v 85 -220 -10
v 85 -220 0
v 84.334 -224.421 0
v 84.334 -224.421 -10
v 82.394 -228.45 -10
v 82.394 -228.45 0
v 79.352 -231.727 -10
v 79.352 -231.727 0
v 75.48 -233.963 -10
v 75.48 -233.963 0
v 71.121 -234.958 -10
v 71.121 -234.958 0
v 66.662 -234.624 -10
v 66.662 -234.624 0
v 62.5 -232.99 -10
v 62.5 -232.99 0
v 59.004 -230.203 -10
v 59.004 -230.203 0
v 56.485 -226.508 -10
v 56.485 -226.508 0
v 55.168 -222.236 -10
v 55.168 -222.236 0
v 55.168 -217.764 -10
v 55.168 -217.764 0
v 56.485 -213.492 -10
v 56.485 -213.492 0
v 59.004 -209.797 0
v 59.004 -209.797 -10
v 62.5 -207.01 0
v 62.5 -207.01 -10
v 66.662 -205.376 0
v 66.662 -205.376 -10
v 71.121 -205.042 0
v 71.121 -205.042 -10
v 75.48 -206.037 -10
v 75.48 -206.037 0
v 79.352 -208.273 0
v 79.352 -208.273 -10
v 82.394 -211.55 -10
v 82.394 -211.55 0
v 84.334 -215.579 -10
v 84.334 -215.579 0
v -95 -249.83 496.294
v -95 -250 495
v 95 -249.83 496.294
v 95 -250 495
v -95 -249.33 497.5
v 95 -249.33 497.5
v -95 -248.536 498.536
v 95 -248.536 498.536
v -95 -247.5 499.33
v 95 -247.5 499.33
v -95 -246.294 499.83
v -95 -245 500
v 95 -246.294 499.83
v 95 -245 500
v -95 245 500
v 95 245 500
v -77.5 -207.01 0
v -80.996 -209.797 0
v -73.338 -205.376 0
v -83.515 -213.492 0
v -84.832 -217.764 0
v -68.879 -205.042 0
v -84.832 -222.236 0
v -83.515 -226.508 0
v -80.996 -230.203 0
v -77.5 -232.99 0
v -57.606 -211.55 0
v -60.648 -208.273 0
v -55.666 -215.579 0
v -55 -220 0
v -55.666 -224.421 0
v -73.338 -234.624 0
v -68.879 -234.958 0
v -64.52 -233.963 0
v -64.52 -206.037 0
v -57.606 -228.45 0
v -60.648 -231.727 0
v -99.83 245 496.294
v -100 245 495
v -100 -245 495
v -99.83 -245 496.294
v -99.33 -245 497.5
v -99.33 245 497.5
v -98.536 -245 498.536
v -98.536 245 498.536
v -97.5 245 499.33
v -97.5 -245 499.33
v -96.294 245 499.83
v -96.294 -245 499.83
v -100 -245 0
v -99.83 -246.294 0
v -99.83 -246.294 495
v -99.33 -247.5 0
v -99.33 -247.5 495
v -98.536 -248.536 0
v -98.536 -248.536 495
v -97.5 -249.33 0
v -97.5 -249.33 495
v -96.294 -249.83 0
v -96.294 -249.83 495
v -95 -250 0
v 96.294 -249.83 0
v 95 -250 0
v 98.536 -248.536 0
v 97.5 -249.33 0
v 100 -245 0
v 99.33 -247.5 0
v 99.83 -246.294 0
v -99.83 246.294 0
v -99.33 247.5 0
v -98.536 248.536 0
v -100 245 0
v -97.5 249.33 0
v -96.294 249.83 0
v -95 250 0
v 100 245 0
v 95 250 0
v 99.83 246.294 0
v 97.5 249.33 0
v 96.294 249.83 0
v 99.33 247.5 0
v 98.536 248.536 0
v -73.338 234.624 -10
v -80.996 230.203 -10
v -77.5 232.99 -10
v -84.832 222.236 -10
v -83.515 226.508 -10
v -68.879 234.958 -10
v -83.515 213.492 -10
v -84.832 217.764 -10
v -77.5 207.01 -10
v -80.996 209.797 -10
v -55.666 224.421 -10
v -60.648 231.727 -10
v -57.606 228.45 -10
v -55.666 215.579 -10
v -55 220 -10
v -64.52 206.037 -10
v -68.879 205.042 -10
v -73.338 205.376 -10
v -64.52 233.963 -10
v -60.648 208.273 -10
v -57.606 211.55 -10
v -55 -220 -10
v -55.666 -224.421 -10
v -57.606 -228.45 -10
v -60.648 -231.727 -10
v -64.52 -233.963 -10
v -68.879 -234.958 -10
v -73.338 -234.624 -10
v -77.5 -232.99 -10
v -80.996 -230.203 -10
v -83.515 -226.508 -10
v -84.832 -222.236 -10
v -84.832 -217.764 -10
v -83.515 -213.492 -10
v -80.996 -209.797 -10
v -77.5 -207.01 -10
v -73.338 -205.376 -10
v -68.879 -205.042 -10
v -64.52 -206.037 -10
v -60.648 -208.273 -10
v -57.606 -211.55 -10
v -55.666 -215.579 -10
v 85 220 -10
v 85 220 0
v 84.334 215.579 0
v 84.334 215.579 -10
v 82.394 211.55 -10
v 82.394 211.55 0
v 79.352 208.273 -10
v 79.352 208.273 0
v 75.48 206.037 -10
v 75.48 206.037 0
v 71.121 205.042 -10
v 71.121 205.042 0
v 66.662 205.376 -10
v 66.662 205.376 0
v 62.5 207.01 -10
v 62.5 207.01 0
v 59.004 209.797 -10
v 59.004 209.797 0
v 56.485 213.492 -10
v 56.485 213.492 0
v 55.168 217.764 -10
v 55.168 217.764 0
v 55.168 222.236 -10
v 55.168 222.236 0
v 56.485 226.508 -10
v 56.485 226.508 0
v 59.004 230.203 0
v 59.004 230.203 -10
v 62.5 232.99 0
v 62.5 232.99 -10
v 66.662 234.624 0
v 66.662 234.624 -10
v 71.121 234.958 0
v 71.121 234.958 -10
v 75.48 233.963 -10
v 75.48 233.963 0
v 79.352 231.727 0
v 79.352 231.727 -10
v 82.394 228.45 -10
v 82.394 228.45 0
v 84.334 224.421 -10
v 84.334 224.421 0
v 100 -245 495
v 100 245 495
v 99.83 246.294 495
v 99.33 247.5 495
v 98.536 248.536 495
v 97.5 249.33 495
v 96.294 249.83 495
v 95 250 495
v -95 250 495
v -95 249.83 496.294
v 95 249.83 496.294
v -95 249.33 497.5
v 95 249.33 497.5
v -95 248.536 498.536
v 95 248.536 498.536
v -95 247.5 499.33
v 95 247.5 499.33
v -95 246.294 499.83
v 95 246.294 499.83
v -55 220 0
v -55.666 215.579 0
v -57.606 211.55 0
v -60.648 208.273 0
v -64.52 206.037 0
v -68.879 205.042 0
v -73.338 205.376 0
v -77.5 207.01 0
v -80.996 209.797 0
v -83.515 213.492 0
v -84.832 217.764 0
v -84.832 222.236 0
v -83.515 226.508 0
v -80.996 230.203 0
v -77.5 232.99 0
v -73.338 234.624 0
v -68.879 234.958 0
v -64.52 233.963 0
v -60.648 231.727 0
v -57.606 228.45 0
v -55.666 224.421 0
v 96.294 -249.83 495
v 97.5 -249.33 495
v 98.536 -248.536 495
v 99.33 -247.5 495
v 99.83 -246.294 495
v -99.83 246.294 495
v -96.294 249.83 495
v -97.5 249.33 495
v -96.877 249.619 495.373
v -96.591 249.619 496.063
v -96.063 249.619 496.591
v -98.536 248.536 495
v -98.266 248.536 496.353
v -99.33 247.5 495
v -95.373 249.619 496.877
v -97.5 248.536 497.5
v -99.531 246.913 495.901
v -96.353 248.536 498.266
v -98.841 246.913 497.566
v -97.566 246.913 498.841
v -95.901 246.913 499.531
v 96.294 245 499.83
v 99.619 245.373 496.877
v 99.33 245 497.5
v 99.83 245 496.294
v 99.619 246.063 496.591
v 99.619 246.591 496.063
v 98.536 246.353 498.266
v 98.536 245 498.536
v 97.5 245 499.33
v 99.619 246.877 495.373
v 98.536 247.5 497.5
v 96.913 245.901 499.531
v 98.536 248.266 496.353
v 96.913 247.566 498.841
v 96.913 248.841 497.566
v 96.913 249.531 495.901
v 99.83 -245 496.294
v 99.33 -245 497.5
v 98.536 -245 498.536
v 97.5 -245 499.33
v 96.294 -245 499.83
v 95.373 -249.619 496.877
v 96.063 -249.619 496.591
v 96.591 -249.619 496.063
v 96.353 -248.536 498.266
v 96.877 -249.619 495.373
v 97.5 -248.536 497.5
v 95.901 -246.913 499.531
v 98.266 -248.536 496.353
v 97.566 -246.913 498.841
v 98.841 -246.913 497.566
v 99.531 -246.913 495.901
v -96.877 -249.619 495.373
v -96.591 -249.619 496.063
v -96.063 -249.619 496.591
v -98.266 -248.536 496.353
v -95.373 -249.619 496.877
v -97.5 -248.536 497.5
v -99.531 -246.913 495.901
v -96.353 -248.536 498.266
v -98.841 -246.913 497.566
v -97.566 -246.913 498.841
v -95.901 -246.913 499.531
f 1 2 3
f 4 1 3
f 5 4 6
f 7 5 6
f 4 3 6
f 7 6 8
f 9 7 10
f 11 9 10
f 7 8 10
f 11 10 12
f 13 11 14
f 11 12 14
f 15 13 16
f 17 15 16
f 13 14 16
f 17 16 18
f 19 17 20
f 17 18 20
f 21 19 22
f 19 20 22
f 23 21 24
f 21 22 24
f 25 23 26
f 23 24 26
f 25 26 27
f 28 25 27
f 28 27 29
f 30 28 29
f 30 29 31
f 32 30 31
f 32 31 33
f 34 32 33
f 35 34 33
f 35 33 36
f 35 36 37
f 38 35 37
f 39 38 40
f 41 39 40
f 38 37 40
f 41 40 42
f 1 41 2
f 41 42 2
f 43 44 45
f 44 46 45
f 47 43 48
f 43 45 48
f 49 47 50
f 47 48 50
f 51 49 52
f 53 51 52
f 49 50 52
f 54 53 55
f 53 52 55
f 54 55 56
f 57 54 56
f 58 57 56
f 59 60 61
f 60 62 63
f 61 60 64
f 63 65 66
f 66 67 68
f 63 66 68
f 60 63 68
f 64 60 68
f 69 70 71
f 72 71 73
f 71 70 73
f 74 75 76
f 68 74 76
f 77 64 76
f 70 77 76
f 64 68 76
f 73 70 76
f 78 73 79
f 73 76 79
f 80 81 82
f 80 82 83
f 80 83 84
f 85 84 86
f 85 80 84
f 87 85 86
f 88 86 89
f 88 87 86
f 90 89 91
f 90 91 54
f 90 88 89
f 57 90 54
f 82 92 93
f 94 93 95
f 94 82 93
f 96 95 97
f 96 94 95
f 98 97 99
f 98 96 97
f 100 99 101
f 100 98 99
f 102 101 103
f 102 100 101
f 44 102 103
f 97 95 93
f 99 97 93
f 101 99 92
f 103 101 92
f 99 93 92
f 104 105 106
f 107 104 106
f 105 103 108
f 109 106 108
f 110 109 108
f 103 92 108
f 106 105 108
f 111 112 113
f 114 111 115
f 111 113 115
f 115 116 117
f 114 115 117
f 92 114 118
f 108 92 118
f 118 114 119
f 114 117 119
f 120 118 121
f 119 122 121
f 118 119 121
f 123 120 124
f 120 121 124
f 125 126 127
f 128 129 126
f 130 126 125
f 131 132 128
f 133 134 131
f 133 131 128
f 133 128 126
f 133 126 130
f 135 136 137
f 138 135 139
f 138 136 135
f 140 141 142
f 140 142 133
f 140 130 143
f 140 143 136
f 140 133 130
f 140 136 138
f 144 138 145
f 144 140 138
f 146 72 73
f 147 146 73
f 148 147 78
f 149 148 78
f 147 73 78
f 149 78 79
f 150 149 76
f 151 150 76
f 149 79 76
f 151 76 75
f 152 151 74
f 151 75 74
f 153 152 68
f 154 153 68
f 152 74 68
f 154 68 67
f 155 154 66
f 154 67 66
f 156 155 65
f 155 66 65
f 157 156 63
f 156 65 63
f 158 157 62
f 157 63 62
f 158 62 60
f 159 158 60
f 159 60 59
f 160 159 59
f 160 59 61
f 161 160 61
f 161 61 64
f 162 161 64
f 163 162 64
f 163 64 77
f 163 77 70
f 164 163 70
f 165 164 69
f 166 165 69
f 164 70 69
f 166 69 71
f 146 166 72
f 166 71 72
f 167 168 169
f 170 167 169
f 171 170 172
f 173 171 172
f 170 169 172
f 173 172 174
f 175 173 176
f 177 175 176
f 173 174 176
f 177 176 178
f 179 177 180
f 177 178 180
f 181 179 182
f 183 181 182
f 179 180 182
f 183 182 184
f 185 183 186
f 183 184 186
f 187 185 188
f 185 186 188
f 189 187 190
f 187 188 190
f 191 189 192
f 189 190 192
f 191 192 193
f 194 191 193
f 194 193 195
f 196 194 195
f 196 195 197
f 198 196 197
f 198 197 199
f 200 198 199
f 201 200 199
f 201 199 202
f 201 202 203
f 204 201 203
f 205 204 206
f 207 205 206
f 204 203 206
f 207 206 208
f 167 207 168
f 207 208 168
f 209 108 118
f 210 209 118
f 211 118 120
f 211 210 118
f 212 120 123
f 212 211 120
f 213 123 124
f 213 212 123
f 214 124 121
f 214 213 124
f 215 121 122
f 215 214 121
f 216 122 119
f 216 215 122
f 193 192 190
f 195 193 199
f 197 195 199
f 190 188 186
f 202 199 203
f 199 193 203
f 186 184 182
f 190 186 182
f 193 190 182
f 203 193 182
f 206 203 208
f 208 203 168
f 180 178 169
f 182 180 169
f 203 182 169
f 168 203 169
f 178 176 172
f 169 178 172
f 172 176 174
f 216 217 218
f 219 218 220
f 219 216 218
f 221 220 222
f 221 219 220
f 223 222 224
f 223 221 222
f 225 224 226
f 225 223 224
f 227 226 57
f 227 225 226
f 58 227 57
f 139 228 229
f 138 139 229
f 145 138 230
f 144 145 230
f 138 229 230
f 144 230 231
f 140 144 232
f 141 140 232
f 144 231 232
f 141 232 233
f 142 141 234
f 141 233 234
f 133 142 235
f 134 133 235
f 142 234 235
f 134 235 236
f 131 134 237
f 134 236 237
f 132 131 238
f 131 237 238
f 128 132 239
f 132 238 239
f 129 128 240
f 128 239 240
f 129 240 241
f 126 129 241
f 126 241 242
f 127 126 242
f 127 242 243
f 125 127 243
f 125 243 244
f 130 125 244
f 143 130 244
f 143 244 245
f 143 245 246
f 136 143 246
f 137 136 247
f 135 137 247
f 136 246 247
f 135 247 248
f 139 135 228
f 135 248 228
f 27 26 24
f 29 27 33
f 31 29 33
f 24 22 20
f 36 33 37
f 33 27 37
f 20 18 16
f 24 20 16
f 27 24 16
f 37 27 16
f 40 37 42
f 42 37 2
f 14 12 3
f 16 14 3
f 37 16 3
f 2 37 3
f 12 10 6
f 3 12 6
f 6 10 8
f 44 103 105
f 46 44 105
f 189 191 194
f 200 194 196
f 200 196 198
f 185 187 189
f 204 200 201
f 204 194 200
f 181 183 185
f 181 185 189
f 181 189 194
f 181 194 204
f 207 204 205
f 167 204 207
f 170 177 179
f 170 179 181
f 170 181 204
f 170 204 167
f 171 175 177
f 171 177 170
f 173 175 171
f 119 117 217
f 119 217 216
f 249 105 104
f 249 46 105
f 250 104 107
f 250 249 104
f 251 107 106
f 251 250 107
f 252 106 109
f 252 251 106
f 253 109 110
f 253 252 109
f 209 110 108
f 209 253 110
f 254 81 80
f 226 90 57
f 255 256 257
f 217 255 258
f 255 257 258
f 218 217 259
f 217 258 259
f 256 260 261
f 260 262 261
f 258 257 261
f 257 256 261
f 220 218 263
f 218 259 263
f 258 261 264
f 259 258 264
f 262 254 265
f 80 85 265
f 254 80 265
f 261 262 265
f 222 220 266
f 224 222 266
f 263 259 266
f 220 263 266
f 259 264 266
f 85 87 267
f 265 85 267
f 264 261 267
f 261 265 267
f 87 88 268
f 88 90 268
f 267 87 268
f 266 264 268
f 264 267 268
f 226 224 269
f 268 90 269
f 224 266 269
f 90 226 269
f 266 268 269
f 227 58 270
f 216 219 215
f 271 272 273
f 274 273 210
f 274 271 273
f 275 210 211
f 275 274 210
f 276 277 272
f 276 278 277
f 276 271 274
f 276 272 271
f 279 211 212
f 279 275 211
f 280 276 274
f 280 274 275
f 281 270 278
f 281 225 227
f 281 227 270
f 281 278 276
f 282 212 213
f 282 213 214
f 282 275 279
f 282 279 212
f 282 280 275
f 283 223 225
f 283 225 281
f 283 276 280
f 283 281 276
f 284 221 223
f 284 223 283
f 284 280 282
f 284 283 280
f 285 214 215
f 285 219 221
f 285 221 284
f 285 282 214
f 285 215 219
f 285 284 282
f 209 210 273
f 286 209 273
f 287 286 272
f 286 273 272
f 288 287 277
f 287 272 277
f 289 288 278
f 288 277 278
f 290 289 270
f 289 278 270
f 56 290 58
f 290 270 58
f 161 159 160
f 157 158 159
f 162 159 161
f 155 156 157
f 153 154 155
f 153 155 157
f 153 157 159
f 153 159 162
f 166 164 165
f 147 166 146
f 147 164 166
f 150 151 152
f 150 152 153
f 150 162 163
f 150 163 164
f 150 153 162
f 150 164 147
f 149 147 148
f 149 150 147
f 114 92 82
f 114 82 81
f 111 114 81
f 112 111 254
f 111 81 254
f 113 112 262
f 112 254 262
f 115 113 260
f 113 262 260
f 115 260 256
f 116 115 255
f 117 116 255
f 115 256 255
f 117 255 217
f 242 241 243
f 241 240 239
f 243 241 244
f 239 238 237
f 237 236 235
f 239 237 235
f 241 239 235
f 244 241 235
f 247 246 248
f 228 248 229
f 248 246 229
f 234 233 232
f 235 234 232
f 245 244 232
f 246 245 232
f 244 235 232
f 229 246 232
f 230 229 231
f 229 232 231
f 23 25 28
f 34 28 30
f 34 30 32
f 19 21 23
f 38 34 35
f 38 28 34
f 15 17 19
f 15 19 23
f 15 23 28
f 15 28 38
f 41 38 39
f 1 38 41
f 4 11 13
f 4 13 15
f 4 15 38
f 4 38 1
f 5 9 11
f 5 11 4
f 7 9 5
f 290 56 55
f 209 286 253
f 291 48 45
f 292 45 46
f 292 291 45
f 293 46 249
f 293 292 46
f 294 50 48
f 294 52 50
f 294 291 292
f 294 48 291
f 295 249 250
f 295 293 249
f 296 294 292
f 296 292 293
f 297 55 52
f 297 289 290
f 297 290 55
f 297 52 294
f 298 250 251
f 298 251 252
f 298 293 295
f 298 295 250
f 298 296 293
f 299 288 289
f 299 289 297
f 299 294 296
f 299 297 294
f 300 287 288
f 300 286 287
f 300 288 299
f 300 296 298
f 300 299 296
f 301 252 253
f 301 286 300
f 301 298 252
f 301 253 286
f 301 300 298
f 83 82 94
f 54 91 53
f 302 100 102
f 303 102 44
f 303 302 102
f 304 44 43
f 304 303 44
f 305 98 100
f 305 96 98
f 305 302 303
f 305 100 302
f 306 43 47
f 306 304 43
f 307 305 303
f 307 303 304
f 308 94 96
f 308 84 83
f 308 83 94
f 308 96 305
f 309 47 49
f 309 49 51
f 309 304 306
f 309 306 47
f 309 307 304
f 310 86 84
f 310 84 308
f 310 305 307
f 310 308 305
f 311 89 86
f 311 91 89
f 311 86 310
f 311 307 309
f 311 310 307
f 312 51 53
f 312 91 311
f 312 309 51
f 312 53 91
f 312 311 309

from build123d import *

# Parameters (mm, degrees)
F0_W     = 200
F0_H     = 500
F1_DEPTH = 500
F2_R     = 15
F3_DEPTH = 10
F4_R     = 5


with BuildPart() as f1:
    # F0 (on Top) → F1 (new body)
    with BuildSketch(Plane.XY):
        Rectangle(F0_W, F0_H)
    extrude(amount=F1_DEPTH)

    # F4
    f4_edges = [f1.edges().sort_by_distance(p)[0] for p in [
        (-100, 0, 500),
        (-100, -250, 250),
        (-100, 250, 250),
        (0, 250, 500),
        (100, 0, 500),
        (0, -250, 500),
        (100, -250, 250),
        (100, 250, 250),
    ]]
    fillet(f4_edges, radius=F4_R)


with BuildPart() as f3:
    # F2 (on face) → F3 (new body)
    with BuildSketch(Plane(origin=(0, 0, 0), x_dir=(1, 0, 0), z_dir=(0, 0, -1))):
        with Locations((-70, 220)):
            Circle(F2_R)
        with Locations((70, 220)):
            Circle(F2_R)
        with Locations((-70, -220)):
            Circle(F2_R)
        with Locations((70, -220)):
            Circle(F2_R)
    extrude(amount=F3_DEPTH)


solid = Compound([f1.part, f3.part])
